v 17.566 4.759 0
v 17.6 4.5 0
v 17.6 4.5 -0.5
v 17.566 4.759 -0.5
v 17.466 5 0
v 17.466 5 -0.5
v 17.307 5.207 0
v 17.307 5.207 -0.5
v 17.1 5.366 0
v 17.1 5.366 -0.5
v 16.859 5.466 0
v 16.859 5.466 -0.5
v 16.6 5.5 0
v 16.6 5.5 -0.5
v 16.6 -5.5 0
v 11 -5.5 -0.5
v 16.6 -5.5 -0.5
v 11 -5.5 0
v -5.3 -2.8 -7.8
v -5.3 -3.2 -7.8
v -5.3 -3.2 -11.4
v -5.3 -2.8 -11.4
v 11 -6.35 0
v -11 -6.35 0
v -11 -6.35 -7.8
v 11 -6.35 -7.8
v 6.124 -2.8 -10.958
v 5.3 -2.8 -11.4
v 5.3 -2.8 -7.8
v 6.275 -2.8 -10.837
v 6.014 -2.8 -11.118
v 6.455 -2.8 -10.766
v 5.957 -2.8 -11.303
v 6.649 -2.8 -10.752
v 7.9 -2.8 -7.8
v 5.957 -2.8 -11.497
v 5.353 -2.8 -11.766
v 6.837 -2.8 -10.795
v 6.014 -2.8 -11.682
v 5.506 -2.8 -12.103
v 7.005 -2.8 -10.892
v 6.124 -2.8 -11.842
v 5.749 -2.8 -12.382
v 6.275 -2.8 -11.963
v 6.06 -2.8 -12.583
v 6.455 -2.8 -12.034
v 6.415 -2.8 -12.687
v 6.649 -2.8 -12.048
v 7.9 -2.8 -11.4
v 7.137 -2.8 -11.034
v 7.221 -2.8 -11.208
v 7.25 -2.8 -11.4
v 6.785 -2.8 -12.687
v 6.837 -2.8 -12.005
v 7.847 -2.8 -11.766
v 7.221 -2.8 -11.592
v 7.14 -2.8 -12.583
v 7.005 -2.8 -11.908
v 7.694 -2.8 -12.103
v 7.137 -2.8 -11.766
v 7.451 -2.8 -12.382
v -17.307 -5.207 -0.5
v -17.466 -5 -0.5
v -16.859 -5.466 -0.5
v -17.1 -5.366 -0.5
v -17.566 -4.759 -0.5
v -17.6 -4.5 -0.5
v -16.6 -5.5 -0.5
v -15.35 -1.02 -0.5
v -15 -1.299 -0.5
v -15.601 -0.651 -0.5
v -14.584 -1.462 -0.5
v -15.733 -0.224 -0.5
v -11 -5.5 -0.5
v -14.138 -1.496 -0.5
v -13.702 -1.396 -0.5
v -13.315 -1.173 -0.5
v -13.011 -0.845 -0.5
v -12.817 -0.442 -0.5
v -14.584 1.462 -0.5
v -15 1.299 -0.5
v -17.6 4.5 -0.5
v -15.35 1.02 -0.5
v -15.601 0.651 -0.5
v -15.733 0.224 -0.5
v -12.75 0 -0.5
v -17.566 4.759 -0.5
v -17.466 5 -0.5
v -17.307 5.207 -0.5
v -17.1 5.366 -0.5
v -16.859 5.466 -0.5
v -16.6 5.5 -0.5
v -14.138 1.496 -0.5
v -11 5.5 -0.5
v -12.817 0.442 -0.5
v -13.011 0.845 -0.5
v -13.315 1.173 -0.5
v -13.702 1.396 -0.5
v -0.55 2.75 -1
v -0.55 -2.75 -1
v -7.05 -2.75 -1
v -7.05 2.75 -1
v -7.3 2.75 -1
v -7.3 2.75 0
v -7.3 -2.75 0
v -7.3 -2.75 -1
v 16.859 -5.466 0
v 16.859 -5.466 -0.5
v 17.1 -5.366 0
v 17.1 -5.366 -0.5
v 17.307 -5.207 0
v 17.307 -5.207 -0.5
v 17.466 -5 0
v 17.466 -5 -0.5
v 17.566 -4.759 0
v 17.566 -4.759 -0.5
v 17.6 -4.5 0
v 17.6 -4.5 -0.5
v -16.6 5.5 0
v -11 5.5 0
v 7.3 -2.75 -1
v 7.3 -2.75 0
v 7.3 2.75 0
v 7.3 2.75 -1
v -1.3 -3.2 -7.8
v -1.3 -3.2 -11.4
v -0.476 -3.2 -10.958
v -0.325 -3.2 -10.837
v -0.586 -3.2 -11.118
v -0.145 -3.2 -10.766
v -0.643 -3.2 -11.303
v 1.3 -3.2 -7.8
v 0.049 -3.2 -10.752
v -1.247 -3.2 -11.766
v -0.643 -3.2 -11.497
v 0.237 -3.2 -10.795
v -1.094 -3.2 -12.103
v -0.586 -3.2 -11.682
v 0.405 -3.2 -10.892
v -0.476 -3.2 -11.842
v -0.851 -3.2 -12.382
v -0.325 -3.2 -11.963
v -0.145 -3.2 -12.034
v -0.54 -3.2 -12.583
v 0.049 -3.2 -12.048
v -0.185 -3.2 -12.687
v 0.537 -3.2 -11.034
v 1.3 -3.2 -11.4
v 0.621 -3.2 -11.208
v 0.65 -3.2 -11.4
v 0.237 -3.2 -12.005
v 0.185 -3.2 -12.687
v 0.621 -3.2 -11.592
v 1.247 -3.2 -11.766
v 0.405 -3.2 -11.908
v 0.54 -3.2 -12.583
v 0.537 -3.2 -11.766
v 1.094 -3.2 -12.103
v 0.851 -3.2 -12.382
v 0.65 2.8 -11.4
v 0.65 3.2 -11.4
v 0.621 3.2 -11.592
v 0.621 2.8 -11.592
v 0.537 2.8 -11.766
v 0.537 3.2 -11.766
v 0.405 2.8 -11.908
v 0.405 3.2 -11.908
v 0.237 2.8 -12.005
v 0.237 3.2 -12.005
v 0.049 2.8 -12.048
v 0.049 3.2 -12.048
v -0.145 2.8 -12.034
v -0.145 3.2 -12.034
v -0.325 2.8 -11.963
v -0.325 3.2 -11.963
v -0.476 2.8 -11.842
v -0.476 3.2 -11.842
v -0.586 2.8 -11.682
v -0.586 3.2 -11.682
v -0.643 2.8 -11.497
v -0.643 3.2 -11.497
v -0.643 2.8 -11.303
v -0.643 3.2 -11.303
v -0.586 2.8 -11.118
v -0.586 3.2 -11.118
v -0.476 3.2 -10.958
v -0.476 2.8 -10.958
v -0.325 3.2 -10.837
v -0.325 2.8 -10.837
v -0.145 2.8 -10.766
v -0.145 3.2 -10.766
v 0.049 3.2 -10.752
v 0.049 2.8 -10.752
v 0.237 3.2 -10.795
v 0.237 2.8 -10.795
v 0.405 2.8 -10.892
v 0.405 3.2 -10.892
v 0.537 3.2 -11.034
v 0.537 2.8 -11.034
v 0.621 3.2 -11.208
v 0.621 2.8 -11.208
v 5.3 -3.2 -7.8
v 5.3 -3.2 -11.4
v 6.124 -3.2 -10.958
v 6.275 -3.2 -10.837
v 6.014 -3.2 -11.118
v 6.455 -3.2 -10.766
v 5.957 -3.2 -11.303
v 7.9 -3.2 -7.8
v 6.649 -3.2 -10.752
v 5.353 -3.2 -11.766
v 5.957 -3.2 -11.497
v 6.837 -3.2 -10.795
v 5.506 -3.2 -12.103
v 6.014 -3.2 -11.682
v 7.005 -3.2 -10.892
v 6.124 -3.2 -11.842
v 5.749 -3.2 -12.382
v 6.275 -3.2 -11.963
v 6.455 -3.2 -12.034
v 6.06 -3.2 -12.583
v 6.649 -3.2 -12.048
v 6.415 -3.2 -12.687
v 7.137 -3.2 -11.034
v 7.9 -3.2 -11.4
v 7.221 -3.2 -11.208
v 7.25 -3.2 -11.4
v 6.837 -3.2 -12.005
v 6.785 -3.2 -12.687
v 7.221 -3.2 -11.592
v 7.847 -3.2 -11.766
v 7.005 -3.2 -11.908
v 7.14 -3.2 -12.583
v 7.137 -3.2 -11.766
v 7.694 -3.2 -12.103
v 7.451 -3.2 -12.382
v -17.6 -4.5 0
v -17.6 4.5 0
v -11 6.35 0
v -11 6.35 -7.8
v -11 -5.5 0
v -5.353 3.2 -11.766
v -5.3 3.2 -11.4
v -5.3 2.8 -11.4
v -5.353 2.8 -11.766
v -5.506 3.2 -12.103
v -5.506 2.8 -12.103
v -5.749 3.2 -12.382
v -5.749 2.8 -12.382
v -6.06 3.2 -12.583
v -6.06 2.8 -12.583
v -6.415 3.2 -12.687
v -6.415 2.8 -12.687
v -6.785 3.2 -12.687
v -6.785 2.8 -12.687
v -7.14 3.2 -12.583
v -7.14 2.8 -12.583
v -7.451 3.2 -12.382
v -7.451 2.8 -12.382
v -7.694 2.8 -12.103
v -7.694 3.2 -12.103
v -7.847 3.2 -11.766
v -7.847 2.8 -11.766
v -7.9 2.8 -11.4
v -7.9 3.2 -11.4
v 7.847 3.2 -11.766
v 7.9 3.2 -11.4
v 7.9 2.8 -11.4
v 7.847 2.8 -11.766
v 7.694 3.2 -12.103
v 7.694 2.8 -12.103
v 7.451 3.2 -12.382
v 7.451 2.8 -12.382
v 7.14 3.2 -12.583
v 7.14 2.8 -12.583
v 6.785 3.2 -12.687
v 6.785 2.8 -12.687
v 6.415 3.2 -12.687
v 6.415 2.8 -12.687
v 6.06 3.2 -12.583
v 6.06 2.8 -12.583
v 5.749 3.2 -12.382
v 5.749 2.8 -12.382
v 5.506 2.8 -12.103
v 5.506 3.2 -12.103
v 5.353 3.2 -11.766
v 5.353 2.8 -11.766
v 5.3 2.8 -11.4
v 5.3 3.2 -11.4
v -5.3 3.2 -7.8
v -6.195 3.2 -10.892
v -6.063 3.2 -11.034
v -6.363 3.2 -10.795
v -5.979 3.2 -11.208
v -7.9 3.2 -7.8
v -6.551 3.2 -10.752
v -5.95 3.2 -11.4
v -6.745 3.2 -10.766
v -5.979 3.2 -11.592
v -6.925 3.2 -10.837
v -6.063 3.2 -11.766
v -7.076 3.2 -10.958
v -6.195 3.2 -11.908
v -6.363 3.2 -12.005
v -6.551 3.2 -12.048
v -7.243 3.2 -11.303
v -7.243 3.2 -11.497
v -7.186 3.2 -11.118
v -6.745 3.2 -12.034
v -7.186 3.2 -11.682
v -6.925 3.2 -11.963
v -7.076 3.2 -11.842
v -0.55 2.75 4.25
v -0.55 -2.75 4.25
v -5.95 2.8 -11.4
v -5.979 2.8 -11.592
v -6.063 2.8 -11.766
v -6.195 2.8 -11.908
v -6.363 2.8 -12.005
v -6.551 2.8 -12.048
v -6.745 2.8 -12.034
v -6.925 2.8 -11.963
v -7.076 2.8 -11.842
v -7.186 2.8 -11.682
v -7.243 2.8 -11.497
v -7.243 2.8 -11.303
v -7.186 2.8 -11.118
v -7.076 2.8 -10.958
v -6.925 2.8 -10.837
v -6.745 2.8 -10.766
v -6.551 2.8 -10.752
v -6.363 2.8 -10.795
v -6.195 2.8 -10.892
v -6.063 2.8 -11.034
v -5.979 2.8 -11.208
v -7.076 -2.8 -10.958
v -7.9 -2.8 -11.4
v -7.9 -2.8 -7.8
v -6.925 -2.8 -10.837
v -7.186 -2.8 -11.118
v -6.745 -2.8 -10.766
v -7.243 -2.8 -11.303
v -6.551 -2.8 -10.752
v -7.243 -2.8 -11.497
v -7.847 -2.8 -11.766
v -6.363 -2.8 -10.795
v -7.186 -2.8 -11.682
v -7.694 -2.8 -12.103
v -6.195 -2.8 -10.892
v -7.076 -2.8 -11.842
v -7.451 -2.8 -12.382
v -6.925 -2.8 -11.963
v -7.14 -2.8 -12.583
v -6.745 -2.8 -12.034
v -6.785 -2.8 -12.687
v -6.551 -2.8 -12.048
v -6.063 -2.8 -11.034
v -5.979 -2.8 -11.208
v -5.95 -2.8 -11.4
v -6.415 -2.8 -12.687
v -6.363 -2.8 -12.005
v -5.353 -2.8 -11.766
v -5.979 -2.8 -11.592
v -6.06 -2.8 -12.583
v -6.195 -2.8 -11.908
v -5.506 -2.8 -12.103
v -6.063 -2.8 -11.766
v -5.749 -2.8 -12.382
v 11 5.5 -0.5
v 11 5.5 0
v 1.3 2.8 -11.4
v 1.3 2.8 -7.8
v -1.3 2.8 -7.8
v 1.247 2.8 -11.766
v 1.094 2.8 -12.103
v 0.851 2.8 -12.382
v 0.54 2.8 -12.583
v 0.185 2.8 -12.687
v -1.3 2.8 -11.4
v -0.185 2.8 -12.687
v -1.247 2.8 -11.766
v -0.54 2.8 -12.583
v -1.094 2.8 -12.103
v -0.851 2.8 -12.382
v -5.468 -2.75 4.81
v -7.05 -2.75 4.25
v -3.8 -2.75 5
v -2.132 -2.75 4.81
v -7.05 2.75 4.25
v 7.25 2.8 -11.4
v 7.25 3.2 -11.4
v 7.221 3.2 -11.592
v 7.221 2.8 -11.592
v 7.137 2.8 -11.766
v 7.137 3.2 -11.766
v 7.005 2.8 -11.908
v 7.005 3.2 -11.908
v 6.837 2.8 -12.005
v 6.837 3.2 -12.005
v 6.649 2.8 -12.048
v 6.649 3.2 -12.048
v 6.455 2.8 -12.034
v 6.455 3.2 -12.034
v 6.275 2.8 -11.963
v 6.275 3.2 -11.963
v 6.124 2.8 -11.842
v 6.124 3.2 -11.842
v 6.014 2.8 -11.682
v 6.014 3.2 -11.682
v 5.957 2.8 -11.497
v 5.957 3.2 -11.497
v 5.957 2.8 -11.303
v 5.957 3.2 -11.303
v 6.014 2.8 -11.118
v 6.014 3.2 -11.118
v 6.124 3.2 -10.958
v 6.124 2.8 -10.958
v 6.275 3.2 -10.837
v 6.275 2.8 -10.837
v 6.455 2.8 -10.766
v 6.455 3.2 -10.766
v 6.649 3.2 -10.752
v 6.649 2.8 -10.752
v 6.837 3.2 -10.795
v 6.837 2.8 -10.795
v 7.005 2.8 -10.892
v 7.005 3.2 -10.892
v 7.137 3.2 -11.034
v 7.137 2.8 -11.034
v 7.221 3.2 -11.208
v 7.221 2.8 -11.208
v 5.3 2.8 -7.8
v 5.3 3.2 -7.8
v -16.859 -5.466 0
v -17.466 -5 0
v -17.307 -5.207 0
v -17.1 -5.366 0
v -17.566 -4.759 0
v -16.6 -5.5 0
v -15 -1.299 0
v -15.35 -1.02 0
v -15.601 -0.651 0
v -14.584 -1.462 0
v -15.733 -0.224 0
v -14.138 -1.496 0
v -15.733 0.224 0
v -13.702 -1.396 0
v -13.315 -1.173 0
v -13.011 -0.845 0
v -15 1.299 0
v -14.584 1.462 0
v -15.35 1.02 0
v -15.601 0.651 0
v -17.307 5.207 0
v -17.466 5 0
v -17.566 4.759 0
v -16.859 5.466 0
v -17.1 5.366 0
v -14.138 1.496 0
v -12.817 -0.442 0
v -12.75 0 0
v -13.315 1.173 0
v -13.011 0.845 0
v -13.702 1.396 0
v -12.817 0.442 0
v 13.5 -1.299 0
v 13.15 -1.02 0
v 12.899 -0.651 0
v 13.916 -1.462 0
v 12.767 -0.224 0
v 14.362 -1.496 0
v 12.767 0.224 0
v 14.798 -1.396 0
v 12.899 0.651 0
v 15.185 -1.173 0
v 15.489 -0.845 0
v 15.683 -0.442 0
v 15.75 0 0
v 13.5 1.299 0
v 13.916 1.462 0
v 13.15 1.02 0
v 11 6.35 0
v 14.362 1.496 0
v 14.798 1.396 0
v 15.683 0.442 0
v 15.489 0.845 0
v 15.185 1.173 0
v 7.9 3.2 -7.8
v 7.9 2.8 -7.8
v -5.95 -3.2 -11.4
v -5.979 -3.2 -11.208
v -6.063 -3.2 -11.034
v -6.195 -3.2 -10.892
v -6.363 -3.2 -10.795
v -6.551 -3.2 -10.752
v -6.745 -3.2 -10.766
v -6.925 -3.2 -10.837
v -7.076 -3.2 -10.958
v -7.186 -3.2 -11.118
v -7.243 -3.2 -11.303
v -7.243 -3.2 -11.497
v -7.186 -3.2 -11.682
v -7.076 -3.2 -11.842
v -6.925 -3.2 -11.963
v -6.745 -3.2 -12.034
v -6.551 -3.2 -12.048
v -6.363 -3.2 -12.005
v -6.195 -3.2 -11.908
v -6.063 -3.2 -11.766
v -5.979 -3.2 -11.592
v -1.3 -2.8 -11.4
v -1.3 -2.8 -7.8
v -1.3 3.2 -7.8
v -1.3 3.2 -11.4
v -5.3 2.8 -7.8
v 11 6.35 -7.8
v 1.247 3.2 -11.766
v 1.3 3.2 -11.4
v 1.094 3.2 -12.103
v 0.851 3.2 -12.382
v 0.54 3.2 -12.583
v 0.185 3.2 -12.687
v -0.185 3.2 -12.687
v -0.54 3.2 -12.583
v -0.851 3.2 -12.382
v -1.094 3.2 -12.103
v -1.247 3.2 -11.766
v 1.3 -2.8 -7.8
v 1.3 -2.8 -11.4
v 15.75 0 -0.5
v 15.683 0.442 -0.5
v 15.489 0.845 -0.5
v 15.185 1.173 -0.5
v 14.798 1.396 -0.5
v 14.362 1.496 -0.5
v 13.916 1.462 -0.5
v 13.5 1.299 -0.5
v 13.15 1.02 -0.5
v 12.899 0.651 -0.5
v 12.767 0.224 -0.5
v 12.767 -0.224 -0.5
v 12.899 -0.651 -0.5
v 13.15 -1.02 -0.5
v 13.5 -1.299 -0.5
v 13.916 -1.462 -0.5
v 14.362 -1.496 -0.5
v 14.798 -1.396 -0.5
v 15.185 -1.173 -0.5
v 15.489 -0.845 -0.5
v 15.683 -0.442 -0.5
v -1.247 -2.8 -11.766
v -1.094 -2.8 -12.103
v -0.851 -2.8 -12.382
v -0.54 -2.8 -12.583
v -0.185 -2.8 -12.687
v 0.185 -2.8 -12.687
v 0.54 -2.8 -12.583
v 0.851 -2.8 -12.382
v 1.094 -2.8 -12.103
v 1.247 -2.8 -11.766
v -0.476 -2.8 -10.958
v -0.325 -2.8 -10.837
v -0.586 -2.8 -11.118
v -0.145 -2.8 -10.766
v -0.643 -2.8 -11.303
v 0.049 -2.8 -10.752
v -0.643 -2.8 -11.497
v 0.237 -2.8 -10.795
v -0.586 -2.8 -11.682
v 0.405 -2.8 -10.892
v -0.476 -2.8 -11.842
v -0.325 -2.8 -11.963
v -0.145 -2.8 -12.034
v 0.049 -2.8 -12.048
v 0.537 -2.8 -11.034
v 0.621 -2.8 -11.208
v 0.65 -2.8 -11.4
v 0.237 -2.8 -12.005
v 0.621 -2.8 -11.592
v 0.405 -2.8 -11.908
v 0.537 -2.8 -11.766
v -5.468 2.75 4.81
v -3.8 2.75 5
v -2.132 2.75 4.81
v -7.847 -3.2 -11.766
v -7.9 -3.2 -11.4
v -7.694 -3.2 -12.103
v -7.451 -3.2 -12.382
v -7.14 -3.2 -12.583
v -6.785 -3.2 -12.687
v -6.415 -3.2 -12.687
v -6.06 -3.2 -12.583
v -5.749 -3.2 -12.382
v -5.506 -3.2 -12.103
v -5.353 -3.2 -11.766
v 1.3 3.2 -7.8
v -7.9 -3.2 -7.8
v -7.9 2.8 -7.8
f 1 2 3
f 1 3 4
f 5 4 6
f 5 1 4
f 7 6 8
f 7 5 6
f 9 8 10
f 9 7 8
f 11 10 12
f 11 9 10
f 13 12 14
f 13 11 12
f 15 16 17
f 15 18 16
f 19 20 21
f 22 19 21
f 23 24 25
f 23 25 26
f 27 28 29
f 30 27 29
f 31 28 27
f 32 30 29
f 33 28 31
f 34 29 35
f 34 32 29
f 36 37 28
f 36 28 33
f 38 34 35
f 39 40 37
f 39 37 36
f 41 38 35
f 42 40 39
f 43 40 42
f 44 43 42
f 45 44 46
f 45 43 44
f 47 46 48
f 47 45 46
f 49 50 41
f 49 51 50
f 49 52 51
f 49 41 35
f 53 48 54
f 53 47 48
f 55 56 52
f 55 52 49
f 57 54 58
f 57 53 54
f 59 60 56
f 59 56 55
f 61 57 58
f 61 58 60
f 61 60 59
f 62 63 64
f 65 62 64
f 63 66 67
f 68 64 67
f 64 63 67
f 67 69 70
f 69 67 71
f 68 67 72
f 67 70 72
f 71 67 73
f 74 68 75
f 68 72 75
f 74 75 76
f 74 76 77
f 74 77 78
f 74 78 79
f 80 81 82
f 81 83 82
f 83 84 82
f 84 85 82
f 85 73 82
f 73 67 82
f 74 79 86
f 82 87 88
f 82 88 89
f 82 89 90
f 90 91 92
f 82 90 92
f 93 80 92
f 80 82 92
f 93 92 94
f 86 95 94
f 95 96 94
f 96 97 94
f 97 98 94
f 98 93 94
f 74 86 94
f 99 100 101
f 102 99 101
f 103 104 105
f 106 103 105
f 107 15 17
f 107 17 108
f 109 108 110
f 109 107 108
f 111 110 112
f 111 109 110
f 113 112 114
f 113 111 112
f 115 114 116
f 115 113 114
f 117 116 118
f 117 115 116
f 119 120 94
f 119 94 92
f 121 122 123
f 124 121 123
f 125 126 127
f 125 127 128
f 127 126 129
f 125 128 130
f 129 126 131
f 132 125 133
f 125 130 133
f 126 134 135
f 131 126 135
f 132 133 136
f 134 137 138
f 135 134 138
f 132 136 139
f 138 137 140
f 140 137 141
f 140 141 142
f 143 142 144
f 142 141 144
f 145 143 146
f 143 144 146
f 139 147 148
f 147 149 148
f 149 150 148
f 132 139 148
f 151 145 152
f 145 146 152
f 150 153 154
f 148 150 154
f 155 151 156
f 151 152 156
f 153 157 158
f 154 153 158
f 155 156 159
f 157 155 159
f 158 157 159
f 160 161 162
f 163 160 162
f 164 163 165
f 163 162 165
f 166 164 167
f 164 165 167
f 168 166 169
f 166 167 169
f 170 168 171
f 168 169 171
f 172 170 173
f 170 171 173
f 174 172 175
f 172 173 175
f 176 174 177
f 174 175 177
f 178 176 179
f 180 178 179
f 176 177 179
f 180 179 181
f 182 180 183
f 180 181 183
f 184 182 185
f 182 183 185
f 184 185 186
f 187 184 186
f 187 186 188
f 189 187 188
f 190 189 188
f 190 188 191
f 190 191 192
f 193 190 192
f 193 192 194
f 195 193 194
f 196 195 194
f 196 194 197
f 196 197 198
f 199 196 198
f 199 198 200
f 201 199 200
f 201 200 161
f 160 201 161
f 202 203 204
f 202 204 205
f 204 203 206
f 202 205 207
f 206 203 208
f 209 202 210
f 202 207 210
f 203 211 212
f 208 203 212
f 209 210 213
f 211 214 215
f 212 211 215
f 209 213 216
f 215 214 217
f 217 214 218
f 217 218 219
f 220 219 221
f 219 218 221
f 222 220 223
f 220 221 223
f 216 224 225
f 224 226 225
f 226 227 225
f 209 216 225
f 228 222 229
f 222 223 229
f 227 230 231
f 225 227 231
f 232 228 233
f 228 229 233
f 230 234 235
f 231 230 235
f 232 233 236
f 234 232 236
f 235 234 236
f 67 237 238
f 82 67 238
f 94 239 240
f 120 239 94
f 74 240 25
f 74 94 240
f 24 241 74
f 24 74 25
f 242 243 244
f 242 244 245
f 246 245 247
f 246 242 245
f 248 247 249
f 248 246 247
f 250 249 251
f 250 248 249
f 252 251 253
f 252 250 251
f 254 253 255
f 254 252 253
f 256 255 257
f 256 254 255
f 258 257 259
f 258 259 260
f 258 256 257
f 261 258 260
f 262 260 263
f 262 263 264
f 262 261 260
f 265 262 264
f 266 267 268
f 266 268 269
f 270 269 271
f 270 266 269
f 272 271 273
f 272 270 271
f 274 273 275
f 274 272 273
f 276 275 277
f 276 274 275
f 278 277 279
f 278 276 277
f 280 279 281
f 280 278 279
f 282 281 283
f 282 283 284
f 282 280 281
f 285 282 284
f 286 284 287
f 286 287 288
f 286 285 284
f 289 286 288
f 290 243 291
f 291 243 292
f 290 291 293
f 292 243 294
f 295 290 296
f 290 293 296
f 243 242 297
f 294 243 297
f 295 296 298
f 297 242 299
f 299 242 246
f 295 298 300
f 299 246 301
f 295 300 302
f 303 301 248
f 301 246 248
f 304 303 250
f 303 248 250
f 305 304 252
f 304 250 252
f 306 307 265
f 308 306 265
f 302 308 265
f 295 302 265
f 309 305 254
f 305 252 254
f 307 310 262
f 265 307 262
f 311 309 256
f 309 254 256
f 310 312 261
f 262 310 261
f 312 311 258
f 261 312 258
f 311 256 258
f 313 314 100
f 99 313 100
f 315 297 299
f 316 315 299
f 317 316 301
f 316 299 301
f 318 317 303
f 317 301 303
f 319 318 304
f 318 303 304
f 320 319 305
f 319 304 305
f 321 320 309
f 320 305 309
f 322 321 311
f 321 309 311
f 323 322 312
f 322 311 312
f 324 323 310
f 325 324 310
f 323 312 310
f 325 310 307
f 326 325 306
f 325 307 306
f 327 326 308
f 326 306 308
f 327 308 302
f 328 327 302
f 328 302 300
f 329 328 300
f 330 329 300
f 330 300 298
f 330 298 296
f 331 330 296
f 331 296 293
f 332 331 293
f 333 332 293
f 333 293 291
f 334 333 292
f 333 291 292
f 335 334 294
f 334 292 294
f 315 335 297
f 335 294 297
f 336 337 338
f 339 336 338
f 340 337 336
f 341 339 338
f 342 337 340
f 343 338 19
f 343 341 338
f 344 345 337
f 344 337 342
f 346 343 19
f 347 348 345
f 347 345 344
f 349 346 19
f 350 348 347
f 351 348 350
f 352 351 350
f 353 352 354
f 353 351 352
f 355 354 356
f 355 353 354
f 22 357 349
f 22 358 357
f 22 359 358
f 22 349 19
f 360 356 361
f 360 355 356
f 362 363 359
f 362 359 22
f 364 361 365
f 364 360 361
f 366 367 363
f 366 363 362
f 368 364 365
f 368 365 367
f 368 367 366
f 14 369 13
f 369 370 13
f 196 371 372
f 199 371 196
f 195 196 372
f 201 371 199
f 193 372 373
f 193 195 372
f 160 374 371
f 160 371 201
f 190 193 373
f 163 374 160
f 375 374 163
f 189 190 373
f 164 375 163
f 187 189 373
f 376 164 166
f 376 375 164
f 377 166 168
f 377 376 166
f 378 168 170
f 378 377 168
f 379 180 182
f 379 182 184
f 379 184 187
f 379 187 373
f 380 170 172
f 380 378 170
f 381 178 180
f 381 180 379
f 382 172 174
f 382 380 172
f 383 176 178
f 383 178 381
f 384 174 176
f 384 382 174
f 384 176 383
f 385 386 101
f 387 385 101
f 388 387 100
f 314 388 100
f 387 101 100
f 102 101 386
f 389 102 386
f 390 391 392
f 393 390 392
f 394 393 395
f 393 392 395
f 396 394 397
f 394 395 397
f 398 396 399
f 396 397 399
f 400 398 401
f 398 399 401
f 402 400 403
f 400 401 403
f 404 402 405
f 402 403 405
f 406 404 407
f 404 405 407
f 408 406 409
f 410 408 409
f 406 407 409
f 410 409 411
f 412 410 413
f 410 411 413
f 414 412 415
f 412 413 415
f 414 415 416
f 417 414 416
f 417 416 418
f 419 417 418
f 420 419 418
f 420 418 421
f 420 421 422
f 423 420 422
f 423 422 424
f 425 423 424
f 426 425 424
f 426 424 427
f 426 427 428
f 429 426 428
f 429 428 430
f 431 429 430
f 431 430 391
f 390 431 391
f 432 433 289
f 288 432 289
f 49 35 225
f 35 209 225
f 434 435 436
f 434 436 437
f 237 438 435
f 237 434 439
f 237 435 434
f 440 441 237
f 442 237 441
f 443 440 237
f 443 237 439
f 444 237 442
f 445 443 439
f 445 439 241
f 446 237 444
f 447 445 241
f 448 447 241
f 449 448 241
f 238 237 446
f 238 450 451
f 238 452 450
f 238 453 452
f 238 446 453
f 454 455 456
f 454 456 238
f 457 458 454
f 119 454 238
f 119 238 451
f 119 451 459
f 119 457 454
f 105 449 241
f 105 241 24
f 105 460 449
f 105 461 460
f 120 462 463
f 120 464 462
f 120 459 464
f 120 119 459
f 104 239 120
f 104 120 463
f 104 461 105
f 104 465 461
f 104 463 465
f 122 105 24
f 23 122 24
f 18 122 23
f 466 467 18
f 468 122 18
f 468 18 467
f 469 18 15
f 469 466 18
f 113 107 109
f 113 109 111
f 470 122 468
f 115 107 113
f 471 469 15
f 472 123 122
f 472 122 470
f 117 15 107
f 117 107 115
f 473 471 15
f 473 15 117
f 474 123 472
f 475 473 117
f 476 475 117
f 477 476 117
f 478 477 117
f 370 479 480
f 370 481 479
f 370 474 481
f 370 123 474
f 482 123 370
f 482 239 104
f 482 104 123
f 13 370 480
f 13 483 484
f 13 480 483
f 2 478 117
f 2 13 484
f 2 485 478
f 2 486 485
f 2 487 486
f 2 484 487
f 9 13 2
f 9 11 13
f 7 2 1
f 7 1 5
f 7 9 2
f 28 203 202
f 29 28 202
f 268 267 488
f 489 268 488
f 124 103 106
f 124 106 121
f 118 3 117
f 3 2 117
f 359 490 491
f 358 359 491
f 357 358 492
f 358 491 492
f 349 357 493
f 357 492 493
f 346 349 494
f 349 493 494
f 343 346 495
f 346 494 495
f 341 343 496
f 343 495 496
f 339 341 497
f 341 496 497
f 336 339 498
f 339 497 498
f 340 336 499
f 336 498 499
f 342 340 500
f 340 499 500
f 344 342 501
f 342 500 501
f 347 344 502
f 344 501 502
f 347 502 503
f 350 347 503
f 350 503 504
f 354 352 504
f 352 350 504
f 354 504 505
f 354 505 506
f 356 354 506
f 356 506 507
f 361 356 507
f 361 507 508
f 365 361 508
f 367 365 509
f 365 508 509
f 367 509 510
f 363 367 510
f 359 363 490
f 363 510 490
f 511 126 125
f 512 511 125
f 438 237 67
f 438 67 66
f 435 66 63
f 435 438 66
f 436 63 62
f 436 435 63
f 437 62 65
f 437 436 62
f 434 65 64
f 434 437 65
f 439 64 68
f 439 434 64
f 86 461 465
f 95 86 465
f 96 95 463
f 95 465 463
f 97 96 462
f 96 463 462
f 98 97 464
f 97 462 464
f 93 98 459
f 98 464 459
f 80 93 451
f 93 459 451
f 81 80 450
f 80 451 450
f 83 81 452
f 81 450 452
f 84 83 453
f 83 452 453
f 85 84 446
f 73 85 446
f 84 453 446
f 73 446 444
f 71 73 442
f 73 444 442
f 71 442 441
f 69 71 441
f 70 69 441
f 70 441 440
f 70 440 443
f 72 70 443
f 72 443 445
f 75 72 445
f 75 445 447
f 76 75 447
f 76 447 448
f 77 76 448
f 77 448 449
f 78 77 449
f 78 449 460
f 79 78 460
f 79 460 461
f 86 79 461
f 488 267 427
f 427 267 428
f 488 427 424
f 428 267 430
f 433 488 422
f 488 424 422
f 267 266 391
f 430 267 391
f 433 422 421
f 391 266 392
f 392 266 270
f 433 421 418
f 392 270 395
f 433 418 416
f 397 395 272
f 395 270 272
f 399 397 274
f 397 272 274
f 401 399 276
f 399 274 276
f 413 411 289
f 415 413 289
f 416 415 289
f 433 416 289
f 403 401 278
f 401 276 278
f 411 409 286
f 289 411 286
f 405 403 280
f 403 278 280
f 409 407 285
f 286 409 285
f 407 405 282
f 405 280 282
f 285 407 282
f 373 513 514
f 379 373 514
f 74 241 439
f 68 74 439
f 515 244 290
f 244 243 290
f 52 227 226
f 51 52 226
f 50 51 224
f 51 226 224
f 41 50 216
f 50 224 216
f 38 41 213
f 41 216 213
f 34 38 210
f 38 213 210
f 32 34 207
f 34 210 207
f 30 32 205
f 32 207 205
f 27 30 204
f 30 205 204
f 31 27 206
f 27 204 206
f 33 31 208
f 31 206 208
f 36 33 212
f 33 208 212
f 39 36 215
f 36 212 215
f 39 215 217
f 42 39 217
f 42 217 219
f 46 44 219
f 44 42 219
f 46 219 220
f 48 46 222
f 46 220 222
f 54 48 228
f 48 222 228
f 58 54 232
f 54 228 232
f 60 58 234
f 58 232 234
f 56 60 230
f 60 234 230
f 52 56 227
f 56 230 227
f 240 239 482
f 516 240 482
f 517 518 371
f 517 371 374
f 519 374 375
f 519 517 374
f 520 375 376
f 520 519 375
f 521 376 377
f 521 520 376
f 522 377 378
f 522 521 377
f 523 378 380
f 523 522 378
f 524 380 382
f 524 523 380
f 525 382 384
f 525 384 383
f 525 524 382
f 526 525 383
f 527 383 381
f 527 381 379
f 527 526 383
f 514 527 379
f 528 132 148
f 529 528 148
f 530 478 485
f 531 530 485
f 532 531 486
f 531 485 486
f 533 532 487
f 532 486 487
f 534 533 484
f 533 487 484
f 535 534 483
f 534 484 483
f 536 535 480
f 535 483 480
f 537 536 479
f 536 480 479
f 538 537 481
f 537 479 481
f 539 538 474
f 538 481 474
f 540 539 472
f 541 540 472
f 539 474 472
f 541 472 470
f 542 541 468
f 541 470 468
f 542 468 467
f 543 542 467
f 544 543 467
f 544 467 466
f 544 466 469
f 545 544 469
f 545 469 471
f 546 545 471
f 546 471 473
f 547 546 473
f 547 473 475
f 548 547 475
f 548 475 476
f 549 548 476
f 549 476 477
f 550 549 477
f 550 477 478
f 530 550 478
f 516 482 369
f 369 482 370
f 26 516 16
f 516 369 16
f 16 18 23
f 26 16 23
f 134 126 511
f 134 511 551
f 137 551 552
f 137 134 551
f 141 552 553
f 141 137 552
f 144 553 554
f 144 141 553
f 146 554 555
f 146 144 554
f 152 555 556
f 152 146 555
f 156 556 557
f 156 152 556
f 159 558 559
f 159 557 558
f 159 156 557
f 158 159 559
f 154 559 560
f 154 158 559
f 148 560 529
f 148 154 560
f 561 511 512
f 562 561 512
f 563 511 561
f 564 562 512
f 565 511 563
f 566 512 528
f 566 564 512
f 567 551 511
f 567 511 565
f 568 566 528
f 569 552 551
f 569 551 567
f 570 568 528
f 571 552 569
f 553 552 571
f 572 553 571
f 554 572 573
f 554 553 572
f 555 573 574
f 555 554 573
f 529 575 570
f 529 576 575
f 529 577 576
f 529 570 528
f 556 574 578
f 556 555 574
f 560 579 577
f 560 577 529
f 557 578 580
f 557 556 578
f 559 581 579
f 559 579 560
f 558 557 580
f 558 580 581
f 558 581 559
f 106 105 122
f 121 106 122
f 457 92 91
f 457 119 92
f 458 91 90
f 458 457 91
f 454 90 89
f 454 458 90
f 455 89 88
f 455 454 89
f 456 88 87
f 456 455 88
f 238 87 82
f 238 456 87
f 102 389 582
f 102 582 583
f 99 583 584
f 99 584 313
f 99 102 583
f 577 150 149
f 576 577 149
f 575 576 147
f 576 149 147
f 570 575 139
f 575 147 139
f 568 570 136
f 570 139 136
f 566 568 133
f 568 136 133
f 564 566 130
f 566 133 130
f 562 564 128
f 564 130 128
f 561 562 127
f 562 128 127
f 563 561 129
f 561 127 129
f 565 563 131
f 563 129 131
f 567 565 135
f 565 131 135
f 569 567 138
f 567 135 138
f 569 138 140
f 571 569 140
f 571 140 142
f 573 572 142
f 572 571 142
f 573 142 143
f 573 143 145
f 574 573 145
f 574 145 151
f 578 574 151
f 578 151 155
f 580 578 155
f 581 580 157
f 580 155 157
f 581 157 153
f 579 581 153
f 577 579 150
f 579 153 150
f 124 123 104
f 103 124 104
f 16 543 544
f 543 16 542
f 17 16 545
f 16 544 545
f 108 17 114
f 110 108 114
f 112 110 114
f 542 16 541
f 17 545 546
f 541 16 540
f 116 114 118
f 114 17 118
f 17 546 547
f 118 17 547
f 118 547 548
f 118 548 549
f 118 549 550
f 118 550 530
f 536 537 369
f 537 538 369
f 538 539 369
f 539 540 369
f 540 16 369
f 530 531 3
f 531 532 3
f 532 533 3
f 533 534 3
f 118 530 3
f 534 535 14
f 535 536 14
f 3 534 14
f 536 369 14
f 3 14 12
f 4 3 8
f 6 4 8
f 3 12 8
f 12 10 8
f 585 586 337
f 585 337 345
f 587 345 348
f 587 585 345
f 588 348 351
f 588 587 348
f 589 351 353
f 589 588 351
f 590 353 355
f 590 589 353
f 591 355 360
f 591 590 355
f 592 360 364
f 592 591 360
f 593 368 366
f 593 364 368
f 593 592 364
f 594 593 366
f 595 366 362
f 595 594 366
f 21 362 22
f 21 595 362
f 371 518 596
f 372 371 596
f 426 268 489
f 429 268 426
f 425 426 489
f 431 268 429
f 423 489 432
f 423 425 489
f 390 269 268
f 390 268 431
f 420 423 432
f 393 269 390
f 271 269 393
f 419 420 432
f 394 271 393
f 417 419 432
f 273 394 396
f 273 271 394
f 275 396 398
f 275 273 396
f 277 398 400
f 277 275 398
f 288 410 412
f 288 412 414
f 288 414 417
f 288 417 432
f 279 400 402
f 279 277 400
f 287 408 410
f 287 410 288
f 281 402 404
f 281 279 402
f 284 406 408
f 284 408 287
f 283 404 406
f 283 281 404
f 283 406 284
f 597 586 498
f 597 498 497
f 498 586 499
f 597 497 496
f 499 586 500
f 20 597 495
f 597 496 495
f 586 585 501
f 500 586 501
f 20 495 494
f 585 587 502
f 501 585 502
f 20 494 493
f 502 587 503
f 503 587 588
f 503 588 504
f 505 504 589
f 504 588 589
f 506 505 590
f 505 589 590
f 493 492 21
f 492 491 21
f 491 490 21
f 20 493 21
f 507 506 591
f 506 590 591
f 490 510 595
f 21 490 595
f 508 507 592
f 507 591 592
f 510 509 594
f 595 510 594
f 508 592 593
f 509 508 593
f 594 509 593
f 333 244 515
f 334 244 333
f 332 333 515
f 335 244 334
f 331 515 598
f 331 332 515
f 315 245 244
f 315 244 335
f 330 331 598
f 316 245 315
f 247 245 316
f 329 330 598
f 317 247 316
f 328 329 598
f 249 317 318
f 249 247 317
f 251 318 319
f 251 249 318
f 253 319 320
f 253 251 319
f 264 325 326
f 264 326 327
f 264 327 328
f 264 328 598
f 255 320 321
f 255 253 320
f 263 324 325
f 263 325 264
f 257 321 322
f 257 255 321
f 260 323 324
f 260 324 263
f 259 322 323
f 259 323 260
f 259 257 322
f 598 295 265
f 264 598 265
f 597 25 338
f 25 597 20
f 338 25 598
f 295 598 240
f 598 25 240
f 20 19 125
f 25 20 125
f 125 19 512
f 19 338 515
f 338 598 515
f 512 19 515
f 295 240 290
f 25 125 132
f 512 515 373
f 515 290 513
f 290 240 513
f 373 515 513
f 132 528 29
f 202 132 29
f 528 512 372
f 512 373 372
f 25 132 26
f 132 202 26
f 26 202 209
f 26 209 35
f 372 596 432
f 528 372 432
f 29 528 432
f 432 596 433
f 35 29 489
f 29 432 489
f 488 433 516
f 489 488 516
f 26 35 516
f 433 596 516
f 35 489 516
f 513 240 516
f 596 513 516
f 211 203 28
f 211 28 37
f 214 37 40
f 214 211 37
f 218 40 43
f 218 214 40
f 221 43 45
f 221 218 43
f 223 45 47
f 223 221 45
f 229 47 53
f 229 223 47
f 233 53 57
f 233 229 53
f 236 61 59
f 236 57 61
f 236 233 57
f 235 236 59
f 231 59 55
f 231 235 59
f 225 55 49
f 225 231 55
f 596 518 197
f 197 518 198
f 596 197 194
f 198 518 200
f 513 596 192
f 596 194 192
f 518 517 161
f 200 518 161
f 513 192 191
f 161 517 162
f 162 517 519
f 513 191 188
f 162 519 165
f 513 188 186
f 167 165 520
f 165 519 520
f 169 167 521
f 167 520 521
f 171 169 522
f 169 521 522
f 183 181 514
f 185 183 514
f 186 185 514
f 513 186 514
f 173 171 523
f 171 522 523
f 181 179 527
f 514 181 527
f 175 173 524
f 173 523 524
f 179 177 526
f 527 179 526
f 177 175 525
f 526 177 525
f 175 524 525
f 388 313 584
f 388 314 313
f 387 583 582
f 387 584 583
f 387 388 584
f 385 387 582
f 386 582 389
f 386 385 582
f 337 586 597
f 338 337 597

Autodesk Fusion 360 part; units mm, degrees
sketch "Sketch1" plane through (0, 0, 0) normal (0, 0, 1) x (1, 0, 0) in component "Metal"
  line L0 (0, 6.35) -> (11, 6.35)
  line L1 (11, 6.35) -> (11, 5.5)
  line L2 (11, 5.5) -> (16.6, 5.5)
  line L3 (17.6, 4.5) -> (17.6, 0)
  line L4 (0, 0) -> (0, 6.35) construction
  line L5 (17.6, 0) -> (0, 0) construction
  arc A0 (17.6, 4.5) -> (16.6, 5.5) centre (16.6, 4.5) ccw
  line L6 (0, -6.35) -> (11, -6.35)
  line L7 (11, -6.35) -> (11, -5.5)
  line L8 (11, -5.5) -> (16.6, -5.5)
  arc A1 (16.6, -5.5) -> (17.6, -4.5) centre (16.6, -4.5) ccw
  line L9 (17.6, -4.5) -> (17.6, 0)
  line L10 (0, 6.35) -> (-11, 6.35)
  line L11 (-11, 6.35) -> (-11, 5.5)
  line L12 (-11, 5.5) -> (-16.6, 5.5)
  arc A2 (-16.6, 5.5) -> (-17.6, 4.5) centre (-16.6, 4.5) ccw
  line L13 (-17.6, 4.5) -> (-17.6, 0)
  line L14 (0, -6.35) -> (-11, -6.35)
  line L15 (-11, -6.35) -> (-11, -5.5)
  line L16 (-11, -5.5) -> (-16.6, -5.5)
  arc A3 (-17.6, -4.5) -> (-16.6, -5.5) centre (-16.6, -4.5) ccw
  line L17 (-17.6, -4.5) -> (-17.6, 0)
  line L18 (7.3, 2.75) -> (-7.3, 2.75)
  line L19 (-7.3, 2.75) -> (-7.3, -2.75)
  line L20 (-7.3, -2.75) -> (7.3, -2.75)
  line L21 (7.3, -2.75) -> (7.3, 2.75)
  line L22 (7.3, 2.75) -> (-7.3, -2.75) construction
  line L23 (-7.3, 2.75) -> (7.3, -2.75) construction
  circle A4 centre (14.25, 0) radius 1.5
  circle A5 centre (-14.25, 0) radius 1.5
  line L24 (11, 5.5) -> (11, -5.5)
  line L25 (-11, 5.5) -> (-11, -5.5)
  point P0 (17.6, 5.5)
  dimension "d1" = 5.5
  dimension "d2" = 6.35
  dimension "d3" = 11
  dimension "d4" = 17.6
  dimension "d5" = 1
  dimension "d6" = 14.6
  dimension "d7" = 5.5
  dimension "d8" = 3
  dimension "d9" = 14.25
extrude "Extrude1" add sketch "Sketch1" against normal blind 0.5 makes body 1 in component "Metal"
extrude "Extrude2" add sketch "Sketch1" against normal blind 7.8 contours L0 L1 L6 L7 L10 L11 L14 L15 L24 L25 | L18 L19 L20 L21 bodies 1 in component "Metal"
ref_plane "WorkPlane1" through (0, -3, 0) normal (0, 1, 0) x (0, 0, 1) in component "Metal"
sketch "Sketch2" plane through (0, -3, 0) normal (0, 1, 0) x (1, 0, 0) in component "Metal"
  line L0 (1.3, 7.8) -> (1.3, 11.4)
  arc A0 (1.3, 11.4) -> (-1.3, 11.4) centre (0, 11.4) ccw
  line L1 (-1.3, 11.4) -> (-1.3, 7.8)
  arc A1 (-1.3, 7.8) -> (1.3, 7.8) centre (0, 7.8) ccw
  line L2 (0, 7.8) -> (0, 11.4) construction
  line L3 (11, 7.8) -> (-11, 7.8)
  circle A2 centre (0, 11.4) radius 0.65
  circle A3 centre (-6.6, 11.4) radius 0.65
  line L4 (-6.6, 7.8) -> (-6.6, 11.4) construction
  arc A4 (-5.3, 11.4) -> (-7.9, 11.4) centre (-6.6, 11.4) ccw
  line L5 (-5.3, 7.8) -> (-5.3, 11.4)
  line L6 (-7.9, 11.4) -> (-7.9, 7.8)
  circle A5 centre (6.6, 11.4) radius 0.65
  line L7 (6.6, 7.8) -> (6.6, 11.4) construction
  arc A6 (7.9, 11.4) -> (5.3, 11.4) centre (6.6, 11.4) ccw
  line L8 (7.9, 7.8) -> (7.9, 11.4)
  line L9 (5.3, 11.4) -> (5.3, 7.8)
  dimension "d15" = 1.3
  dimension "d16" = 12.7
  dimension "d17" = 1.3
  dimension "d20" = 6.6
  dimension "d21" = 0
extrude "Extrude3" add sketch "Sketch2" along normal mid plane 0.4 contours L0 A0 L1 L3 | L3 A4 L5 L6 | L3 A6 L8 L9 bodies 1 in component "Metal"
mirror "Mirror1" about plane through (0, 0, 0) normal (0, 1, 0) of "Extrude3" in component "Metal"
extrude "Extrude4" cut sketch "Sketch1" against normal blind 1 contours L18 L19 L20 L21 bodies 1 in component "Metal"
sketch "Sketch1 (2)" plane through (0, 0, 0) normal (0, 1, 0) x (1, 0, 0) in component "Switch"
  line L0 (-7.05, -4.25) -> (-0.55, -4.25) construction
  line L1 (-0.55, -4.25) -> (-0.55, 1)
  line L2 (-0.55, 1) -> (-7.05, 1)
  line L3 (-7.05, 1) -> (-7.05, -4.25)
  arc A0 (-7.05, -4.25) -> (-0.55, -4.25) centre (-3.8, 2.4167) ccw
  line L4 (-11, 0) -> (11, 0)
  line L5 (7.3, 1) -> (-7.3, 1)
  dimension "d28" = 5
  dimension "d29" = 0.25
  dimension "d30" = 4.25
  dimension "d31" = 6.5
extrude "Extrude1'" add sketch "Sketch1 (2)" along normal mid plane 5.5 separate body makes body 2 in component "Switch"
component "Metal" placed x (1, 0, 0) y (0, 1, 0) z (0, 0, 1) at (0, 0, 0)
component "Switch" placed x (1, 0, 0) y (0, 1, 0) z (0, 0, 1) at (0, 0, 0)
equation "d1 = ( 11 / 2 ) * 1 mm"
equation "d2 = ( 12.7 / 2 ) * 1 mm"
equation "d4 = ( 35.2 / 2 ) * 1 mm"
equation "d6 = 6.5 mm + 2.7 mm + 2.7 mm + 2.7 mm"
equation "d9 = ( 28.5 / 2 ) * 1 mm"
equation "d15 = 2.6 mm / 2"
equation "d30 = d28 - 0.75 mm"
